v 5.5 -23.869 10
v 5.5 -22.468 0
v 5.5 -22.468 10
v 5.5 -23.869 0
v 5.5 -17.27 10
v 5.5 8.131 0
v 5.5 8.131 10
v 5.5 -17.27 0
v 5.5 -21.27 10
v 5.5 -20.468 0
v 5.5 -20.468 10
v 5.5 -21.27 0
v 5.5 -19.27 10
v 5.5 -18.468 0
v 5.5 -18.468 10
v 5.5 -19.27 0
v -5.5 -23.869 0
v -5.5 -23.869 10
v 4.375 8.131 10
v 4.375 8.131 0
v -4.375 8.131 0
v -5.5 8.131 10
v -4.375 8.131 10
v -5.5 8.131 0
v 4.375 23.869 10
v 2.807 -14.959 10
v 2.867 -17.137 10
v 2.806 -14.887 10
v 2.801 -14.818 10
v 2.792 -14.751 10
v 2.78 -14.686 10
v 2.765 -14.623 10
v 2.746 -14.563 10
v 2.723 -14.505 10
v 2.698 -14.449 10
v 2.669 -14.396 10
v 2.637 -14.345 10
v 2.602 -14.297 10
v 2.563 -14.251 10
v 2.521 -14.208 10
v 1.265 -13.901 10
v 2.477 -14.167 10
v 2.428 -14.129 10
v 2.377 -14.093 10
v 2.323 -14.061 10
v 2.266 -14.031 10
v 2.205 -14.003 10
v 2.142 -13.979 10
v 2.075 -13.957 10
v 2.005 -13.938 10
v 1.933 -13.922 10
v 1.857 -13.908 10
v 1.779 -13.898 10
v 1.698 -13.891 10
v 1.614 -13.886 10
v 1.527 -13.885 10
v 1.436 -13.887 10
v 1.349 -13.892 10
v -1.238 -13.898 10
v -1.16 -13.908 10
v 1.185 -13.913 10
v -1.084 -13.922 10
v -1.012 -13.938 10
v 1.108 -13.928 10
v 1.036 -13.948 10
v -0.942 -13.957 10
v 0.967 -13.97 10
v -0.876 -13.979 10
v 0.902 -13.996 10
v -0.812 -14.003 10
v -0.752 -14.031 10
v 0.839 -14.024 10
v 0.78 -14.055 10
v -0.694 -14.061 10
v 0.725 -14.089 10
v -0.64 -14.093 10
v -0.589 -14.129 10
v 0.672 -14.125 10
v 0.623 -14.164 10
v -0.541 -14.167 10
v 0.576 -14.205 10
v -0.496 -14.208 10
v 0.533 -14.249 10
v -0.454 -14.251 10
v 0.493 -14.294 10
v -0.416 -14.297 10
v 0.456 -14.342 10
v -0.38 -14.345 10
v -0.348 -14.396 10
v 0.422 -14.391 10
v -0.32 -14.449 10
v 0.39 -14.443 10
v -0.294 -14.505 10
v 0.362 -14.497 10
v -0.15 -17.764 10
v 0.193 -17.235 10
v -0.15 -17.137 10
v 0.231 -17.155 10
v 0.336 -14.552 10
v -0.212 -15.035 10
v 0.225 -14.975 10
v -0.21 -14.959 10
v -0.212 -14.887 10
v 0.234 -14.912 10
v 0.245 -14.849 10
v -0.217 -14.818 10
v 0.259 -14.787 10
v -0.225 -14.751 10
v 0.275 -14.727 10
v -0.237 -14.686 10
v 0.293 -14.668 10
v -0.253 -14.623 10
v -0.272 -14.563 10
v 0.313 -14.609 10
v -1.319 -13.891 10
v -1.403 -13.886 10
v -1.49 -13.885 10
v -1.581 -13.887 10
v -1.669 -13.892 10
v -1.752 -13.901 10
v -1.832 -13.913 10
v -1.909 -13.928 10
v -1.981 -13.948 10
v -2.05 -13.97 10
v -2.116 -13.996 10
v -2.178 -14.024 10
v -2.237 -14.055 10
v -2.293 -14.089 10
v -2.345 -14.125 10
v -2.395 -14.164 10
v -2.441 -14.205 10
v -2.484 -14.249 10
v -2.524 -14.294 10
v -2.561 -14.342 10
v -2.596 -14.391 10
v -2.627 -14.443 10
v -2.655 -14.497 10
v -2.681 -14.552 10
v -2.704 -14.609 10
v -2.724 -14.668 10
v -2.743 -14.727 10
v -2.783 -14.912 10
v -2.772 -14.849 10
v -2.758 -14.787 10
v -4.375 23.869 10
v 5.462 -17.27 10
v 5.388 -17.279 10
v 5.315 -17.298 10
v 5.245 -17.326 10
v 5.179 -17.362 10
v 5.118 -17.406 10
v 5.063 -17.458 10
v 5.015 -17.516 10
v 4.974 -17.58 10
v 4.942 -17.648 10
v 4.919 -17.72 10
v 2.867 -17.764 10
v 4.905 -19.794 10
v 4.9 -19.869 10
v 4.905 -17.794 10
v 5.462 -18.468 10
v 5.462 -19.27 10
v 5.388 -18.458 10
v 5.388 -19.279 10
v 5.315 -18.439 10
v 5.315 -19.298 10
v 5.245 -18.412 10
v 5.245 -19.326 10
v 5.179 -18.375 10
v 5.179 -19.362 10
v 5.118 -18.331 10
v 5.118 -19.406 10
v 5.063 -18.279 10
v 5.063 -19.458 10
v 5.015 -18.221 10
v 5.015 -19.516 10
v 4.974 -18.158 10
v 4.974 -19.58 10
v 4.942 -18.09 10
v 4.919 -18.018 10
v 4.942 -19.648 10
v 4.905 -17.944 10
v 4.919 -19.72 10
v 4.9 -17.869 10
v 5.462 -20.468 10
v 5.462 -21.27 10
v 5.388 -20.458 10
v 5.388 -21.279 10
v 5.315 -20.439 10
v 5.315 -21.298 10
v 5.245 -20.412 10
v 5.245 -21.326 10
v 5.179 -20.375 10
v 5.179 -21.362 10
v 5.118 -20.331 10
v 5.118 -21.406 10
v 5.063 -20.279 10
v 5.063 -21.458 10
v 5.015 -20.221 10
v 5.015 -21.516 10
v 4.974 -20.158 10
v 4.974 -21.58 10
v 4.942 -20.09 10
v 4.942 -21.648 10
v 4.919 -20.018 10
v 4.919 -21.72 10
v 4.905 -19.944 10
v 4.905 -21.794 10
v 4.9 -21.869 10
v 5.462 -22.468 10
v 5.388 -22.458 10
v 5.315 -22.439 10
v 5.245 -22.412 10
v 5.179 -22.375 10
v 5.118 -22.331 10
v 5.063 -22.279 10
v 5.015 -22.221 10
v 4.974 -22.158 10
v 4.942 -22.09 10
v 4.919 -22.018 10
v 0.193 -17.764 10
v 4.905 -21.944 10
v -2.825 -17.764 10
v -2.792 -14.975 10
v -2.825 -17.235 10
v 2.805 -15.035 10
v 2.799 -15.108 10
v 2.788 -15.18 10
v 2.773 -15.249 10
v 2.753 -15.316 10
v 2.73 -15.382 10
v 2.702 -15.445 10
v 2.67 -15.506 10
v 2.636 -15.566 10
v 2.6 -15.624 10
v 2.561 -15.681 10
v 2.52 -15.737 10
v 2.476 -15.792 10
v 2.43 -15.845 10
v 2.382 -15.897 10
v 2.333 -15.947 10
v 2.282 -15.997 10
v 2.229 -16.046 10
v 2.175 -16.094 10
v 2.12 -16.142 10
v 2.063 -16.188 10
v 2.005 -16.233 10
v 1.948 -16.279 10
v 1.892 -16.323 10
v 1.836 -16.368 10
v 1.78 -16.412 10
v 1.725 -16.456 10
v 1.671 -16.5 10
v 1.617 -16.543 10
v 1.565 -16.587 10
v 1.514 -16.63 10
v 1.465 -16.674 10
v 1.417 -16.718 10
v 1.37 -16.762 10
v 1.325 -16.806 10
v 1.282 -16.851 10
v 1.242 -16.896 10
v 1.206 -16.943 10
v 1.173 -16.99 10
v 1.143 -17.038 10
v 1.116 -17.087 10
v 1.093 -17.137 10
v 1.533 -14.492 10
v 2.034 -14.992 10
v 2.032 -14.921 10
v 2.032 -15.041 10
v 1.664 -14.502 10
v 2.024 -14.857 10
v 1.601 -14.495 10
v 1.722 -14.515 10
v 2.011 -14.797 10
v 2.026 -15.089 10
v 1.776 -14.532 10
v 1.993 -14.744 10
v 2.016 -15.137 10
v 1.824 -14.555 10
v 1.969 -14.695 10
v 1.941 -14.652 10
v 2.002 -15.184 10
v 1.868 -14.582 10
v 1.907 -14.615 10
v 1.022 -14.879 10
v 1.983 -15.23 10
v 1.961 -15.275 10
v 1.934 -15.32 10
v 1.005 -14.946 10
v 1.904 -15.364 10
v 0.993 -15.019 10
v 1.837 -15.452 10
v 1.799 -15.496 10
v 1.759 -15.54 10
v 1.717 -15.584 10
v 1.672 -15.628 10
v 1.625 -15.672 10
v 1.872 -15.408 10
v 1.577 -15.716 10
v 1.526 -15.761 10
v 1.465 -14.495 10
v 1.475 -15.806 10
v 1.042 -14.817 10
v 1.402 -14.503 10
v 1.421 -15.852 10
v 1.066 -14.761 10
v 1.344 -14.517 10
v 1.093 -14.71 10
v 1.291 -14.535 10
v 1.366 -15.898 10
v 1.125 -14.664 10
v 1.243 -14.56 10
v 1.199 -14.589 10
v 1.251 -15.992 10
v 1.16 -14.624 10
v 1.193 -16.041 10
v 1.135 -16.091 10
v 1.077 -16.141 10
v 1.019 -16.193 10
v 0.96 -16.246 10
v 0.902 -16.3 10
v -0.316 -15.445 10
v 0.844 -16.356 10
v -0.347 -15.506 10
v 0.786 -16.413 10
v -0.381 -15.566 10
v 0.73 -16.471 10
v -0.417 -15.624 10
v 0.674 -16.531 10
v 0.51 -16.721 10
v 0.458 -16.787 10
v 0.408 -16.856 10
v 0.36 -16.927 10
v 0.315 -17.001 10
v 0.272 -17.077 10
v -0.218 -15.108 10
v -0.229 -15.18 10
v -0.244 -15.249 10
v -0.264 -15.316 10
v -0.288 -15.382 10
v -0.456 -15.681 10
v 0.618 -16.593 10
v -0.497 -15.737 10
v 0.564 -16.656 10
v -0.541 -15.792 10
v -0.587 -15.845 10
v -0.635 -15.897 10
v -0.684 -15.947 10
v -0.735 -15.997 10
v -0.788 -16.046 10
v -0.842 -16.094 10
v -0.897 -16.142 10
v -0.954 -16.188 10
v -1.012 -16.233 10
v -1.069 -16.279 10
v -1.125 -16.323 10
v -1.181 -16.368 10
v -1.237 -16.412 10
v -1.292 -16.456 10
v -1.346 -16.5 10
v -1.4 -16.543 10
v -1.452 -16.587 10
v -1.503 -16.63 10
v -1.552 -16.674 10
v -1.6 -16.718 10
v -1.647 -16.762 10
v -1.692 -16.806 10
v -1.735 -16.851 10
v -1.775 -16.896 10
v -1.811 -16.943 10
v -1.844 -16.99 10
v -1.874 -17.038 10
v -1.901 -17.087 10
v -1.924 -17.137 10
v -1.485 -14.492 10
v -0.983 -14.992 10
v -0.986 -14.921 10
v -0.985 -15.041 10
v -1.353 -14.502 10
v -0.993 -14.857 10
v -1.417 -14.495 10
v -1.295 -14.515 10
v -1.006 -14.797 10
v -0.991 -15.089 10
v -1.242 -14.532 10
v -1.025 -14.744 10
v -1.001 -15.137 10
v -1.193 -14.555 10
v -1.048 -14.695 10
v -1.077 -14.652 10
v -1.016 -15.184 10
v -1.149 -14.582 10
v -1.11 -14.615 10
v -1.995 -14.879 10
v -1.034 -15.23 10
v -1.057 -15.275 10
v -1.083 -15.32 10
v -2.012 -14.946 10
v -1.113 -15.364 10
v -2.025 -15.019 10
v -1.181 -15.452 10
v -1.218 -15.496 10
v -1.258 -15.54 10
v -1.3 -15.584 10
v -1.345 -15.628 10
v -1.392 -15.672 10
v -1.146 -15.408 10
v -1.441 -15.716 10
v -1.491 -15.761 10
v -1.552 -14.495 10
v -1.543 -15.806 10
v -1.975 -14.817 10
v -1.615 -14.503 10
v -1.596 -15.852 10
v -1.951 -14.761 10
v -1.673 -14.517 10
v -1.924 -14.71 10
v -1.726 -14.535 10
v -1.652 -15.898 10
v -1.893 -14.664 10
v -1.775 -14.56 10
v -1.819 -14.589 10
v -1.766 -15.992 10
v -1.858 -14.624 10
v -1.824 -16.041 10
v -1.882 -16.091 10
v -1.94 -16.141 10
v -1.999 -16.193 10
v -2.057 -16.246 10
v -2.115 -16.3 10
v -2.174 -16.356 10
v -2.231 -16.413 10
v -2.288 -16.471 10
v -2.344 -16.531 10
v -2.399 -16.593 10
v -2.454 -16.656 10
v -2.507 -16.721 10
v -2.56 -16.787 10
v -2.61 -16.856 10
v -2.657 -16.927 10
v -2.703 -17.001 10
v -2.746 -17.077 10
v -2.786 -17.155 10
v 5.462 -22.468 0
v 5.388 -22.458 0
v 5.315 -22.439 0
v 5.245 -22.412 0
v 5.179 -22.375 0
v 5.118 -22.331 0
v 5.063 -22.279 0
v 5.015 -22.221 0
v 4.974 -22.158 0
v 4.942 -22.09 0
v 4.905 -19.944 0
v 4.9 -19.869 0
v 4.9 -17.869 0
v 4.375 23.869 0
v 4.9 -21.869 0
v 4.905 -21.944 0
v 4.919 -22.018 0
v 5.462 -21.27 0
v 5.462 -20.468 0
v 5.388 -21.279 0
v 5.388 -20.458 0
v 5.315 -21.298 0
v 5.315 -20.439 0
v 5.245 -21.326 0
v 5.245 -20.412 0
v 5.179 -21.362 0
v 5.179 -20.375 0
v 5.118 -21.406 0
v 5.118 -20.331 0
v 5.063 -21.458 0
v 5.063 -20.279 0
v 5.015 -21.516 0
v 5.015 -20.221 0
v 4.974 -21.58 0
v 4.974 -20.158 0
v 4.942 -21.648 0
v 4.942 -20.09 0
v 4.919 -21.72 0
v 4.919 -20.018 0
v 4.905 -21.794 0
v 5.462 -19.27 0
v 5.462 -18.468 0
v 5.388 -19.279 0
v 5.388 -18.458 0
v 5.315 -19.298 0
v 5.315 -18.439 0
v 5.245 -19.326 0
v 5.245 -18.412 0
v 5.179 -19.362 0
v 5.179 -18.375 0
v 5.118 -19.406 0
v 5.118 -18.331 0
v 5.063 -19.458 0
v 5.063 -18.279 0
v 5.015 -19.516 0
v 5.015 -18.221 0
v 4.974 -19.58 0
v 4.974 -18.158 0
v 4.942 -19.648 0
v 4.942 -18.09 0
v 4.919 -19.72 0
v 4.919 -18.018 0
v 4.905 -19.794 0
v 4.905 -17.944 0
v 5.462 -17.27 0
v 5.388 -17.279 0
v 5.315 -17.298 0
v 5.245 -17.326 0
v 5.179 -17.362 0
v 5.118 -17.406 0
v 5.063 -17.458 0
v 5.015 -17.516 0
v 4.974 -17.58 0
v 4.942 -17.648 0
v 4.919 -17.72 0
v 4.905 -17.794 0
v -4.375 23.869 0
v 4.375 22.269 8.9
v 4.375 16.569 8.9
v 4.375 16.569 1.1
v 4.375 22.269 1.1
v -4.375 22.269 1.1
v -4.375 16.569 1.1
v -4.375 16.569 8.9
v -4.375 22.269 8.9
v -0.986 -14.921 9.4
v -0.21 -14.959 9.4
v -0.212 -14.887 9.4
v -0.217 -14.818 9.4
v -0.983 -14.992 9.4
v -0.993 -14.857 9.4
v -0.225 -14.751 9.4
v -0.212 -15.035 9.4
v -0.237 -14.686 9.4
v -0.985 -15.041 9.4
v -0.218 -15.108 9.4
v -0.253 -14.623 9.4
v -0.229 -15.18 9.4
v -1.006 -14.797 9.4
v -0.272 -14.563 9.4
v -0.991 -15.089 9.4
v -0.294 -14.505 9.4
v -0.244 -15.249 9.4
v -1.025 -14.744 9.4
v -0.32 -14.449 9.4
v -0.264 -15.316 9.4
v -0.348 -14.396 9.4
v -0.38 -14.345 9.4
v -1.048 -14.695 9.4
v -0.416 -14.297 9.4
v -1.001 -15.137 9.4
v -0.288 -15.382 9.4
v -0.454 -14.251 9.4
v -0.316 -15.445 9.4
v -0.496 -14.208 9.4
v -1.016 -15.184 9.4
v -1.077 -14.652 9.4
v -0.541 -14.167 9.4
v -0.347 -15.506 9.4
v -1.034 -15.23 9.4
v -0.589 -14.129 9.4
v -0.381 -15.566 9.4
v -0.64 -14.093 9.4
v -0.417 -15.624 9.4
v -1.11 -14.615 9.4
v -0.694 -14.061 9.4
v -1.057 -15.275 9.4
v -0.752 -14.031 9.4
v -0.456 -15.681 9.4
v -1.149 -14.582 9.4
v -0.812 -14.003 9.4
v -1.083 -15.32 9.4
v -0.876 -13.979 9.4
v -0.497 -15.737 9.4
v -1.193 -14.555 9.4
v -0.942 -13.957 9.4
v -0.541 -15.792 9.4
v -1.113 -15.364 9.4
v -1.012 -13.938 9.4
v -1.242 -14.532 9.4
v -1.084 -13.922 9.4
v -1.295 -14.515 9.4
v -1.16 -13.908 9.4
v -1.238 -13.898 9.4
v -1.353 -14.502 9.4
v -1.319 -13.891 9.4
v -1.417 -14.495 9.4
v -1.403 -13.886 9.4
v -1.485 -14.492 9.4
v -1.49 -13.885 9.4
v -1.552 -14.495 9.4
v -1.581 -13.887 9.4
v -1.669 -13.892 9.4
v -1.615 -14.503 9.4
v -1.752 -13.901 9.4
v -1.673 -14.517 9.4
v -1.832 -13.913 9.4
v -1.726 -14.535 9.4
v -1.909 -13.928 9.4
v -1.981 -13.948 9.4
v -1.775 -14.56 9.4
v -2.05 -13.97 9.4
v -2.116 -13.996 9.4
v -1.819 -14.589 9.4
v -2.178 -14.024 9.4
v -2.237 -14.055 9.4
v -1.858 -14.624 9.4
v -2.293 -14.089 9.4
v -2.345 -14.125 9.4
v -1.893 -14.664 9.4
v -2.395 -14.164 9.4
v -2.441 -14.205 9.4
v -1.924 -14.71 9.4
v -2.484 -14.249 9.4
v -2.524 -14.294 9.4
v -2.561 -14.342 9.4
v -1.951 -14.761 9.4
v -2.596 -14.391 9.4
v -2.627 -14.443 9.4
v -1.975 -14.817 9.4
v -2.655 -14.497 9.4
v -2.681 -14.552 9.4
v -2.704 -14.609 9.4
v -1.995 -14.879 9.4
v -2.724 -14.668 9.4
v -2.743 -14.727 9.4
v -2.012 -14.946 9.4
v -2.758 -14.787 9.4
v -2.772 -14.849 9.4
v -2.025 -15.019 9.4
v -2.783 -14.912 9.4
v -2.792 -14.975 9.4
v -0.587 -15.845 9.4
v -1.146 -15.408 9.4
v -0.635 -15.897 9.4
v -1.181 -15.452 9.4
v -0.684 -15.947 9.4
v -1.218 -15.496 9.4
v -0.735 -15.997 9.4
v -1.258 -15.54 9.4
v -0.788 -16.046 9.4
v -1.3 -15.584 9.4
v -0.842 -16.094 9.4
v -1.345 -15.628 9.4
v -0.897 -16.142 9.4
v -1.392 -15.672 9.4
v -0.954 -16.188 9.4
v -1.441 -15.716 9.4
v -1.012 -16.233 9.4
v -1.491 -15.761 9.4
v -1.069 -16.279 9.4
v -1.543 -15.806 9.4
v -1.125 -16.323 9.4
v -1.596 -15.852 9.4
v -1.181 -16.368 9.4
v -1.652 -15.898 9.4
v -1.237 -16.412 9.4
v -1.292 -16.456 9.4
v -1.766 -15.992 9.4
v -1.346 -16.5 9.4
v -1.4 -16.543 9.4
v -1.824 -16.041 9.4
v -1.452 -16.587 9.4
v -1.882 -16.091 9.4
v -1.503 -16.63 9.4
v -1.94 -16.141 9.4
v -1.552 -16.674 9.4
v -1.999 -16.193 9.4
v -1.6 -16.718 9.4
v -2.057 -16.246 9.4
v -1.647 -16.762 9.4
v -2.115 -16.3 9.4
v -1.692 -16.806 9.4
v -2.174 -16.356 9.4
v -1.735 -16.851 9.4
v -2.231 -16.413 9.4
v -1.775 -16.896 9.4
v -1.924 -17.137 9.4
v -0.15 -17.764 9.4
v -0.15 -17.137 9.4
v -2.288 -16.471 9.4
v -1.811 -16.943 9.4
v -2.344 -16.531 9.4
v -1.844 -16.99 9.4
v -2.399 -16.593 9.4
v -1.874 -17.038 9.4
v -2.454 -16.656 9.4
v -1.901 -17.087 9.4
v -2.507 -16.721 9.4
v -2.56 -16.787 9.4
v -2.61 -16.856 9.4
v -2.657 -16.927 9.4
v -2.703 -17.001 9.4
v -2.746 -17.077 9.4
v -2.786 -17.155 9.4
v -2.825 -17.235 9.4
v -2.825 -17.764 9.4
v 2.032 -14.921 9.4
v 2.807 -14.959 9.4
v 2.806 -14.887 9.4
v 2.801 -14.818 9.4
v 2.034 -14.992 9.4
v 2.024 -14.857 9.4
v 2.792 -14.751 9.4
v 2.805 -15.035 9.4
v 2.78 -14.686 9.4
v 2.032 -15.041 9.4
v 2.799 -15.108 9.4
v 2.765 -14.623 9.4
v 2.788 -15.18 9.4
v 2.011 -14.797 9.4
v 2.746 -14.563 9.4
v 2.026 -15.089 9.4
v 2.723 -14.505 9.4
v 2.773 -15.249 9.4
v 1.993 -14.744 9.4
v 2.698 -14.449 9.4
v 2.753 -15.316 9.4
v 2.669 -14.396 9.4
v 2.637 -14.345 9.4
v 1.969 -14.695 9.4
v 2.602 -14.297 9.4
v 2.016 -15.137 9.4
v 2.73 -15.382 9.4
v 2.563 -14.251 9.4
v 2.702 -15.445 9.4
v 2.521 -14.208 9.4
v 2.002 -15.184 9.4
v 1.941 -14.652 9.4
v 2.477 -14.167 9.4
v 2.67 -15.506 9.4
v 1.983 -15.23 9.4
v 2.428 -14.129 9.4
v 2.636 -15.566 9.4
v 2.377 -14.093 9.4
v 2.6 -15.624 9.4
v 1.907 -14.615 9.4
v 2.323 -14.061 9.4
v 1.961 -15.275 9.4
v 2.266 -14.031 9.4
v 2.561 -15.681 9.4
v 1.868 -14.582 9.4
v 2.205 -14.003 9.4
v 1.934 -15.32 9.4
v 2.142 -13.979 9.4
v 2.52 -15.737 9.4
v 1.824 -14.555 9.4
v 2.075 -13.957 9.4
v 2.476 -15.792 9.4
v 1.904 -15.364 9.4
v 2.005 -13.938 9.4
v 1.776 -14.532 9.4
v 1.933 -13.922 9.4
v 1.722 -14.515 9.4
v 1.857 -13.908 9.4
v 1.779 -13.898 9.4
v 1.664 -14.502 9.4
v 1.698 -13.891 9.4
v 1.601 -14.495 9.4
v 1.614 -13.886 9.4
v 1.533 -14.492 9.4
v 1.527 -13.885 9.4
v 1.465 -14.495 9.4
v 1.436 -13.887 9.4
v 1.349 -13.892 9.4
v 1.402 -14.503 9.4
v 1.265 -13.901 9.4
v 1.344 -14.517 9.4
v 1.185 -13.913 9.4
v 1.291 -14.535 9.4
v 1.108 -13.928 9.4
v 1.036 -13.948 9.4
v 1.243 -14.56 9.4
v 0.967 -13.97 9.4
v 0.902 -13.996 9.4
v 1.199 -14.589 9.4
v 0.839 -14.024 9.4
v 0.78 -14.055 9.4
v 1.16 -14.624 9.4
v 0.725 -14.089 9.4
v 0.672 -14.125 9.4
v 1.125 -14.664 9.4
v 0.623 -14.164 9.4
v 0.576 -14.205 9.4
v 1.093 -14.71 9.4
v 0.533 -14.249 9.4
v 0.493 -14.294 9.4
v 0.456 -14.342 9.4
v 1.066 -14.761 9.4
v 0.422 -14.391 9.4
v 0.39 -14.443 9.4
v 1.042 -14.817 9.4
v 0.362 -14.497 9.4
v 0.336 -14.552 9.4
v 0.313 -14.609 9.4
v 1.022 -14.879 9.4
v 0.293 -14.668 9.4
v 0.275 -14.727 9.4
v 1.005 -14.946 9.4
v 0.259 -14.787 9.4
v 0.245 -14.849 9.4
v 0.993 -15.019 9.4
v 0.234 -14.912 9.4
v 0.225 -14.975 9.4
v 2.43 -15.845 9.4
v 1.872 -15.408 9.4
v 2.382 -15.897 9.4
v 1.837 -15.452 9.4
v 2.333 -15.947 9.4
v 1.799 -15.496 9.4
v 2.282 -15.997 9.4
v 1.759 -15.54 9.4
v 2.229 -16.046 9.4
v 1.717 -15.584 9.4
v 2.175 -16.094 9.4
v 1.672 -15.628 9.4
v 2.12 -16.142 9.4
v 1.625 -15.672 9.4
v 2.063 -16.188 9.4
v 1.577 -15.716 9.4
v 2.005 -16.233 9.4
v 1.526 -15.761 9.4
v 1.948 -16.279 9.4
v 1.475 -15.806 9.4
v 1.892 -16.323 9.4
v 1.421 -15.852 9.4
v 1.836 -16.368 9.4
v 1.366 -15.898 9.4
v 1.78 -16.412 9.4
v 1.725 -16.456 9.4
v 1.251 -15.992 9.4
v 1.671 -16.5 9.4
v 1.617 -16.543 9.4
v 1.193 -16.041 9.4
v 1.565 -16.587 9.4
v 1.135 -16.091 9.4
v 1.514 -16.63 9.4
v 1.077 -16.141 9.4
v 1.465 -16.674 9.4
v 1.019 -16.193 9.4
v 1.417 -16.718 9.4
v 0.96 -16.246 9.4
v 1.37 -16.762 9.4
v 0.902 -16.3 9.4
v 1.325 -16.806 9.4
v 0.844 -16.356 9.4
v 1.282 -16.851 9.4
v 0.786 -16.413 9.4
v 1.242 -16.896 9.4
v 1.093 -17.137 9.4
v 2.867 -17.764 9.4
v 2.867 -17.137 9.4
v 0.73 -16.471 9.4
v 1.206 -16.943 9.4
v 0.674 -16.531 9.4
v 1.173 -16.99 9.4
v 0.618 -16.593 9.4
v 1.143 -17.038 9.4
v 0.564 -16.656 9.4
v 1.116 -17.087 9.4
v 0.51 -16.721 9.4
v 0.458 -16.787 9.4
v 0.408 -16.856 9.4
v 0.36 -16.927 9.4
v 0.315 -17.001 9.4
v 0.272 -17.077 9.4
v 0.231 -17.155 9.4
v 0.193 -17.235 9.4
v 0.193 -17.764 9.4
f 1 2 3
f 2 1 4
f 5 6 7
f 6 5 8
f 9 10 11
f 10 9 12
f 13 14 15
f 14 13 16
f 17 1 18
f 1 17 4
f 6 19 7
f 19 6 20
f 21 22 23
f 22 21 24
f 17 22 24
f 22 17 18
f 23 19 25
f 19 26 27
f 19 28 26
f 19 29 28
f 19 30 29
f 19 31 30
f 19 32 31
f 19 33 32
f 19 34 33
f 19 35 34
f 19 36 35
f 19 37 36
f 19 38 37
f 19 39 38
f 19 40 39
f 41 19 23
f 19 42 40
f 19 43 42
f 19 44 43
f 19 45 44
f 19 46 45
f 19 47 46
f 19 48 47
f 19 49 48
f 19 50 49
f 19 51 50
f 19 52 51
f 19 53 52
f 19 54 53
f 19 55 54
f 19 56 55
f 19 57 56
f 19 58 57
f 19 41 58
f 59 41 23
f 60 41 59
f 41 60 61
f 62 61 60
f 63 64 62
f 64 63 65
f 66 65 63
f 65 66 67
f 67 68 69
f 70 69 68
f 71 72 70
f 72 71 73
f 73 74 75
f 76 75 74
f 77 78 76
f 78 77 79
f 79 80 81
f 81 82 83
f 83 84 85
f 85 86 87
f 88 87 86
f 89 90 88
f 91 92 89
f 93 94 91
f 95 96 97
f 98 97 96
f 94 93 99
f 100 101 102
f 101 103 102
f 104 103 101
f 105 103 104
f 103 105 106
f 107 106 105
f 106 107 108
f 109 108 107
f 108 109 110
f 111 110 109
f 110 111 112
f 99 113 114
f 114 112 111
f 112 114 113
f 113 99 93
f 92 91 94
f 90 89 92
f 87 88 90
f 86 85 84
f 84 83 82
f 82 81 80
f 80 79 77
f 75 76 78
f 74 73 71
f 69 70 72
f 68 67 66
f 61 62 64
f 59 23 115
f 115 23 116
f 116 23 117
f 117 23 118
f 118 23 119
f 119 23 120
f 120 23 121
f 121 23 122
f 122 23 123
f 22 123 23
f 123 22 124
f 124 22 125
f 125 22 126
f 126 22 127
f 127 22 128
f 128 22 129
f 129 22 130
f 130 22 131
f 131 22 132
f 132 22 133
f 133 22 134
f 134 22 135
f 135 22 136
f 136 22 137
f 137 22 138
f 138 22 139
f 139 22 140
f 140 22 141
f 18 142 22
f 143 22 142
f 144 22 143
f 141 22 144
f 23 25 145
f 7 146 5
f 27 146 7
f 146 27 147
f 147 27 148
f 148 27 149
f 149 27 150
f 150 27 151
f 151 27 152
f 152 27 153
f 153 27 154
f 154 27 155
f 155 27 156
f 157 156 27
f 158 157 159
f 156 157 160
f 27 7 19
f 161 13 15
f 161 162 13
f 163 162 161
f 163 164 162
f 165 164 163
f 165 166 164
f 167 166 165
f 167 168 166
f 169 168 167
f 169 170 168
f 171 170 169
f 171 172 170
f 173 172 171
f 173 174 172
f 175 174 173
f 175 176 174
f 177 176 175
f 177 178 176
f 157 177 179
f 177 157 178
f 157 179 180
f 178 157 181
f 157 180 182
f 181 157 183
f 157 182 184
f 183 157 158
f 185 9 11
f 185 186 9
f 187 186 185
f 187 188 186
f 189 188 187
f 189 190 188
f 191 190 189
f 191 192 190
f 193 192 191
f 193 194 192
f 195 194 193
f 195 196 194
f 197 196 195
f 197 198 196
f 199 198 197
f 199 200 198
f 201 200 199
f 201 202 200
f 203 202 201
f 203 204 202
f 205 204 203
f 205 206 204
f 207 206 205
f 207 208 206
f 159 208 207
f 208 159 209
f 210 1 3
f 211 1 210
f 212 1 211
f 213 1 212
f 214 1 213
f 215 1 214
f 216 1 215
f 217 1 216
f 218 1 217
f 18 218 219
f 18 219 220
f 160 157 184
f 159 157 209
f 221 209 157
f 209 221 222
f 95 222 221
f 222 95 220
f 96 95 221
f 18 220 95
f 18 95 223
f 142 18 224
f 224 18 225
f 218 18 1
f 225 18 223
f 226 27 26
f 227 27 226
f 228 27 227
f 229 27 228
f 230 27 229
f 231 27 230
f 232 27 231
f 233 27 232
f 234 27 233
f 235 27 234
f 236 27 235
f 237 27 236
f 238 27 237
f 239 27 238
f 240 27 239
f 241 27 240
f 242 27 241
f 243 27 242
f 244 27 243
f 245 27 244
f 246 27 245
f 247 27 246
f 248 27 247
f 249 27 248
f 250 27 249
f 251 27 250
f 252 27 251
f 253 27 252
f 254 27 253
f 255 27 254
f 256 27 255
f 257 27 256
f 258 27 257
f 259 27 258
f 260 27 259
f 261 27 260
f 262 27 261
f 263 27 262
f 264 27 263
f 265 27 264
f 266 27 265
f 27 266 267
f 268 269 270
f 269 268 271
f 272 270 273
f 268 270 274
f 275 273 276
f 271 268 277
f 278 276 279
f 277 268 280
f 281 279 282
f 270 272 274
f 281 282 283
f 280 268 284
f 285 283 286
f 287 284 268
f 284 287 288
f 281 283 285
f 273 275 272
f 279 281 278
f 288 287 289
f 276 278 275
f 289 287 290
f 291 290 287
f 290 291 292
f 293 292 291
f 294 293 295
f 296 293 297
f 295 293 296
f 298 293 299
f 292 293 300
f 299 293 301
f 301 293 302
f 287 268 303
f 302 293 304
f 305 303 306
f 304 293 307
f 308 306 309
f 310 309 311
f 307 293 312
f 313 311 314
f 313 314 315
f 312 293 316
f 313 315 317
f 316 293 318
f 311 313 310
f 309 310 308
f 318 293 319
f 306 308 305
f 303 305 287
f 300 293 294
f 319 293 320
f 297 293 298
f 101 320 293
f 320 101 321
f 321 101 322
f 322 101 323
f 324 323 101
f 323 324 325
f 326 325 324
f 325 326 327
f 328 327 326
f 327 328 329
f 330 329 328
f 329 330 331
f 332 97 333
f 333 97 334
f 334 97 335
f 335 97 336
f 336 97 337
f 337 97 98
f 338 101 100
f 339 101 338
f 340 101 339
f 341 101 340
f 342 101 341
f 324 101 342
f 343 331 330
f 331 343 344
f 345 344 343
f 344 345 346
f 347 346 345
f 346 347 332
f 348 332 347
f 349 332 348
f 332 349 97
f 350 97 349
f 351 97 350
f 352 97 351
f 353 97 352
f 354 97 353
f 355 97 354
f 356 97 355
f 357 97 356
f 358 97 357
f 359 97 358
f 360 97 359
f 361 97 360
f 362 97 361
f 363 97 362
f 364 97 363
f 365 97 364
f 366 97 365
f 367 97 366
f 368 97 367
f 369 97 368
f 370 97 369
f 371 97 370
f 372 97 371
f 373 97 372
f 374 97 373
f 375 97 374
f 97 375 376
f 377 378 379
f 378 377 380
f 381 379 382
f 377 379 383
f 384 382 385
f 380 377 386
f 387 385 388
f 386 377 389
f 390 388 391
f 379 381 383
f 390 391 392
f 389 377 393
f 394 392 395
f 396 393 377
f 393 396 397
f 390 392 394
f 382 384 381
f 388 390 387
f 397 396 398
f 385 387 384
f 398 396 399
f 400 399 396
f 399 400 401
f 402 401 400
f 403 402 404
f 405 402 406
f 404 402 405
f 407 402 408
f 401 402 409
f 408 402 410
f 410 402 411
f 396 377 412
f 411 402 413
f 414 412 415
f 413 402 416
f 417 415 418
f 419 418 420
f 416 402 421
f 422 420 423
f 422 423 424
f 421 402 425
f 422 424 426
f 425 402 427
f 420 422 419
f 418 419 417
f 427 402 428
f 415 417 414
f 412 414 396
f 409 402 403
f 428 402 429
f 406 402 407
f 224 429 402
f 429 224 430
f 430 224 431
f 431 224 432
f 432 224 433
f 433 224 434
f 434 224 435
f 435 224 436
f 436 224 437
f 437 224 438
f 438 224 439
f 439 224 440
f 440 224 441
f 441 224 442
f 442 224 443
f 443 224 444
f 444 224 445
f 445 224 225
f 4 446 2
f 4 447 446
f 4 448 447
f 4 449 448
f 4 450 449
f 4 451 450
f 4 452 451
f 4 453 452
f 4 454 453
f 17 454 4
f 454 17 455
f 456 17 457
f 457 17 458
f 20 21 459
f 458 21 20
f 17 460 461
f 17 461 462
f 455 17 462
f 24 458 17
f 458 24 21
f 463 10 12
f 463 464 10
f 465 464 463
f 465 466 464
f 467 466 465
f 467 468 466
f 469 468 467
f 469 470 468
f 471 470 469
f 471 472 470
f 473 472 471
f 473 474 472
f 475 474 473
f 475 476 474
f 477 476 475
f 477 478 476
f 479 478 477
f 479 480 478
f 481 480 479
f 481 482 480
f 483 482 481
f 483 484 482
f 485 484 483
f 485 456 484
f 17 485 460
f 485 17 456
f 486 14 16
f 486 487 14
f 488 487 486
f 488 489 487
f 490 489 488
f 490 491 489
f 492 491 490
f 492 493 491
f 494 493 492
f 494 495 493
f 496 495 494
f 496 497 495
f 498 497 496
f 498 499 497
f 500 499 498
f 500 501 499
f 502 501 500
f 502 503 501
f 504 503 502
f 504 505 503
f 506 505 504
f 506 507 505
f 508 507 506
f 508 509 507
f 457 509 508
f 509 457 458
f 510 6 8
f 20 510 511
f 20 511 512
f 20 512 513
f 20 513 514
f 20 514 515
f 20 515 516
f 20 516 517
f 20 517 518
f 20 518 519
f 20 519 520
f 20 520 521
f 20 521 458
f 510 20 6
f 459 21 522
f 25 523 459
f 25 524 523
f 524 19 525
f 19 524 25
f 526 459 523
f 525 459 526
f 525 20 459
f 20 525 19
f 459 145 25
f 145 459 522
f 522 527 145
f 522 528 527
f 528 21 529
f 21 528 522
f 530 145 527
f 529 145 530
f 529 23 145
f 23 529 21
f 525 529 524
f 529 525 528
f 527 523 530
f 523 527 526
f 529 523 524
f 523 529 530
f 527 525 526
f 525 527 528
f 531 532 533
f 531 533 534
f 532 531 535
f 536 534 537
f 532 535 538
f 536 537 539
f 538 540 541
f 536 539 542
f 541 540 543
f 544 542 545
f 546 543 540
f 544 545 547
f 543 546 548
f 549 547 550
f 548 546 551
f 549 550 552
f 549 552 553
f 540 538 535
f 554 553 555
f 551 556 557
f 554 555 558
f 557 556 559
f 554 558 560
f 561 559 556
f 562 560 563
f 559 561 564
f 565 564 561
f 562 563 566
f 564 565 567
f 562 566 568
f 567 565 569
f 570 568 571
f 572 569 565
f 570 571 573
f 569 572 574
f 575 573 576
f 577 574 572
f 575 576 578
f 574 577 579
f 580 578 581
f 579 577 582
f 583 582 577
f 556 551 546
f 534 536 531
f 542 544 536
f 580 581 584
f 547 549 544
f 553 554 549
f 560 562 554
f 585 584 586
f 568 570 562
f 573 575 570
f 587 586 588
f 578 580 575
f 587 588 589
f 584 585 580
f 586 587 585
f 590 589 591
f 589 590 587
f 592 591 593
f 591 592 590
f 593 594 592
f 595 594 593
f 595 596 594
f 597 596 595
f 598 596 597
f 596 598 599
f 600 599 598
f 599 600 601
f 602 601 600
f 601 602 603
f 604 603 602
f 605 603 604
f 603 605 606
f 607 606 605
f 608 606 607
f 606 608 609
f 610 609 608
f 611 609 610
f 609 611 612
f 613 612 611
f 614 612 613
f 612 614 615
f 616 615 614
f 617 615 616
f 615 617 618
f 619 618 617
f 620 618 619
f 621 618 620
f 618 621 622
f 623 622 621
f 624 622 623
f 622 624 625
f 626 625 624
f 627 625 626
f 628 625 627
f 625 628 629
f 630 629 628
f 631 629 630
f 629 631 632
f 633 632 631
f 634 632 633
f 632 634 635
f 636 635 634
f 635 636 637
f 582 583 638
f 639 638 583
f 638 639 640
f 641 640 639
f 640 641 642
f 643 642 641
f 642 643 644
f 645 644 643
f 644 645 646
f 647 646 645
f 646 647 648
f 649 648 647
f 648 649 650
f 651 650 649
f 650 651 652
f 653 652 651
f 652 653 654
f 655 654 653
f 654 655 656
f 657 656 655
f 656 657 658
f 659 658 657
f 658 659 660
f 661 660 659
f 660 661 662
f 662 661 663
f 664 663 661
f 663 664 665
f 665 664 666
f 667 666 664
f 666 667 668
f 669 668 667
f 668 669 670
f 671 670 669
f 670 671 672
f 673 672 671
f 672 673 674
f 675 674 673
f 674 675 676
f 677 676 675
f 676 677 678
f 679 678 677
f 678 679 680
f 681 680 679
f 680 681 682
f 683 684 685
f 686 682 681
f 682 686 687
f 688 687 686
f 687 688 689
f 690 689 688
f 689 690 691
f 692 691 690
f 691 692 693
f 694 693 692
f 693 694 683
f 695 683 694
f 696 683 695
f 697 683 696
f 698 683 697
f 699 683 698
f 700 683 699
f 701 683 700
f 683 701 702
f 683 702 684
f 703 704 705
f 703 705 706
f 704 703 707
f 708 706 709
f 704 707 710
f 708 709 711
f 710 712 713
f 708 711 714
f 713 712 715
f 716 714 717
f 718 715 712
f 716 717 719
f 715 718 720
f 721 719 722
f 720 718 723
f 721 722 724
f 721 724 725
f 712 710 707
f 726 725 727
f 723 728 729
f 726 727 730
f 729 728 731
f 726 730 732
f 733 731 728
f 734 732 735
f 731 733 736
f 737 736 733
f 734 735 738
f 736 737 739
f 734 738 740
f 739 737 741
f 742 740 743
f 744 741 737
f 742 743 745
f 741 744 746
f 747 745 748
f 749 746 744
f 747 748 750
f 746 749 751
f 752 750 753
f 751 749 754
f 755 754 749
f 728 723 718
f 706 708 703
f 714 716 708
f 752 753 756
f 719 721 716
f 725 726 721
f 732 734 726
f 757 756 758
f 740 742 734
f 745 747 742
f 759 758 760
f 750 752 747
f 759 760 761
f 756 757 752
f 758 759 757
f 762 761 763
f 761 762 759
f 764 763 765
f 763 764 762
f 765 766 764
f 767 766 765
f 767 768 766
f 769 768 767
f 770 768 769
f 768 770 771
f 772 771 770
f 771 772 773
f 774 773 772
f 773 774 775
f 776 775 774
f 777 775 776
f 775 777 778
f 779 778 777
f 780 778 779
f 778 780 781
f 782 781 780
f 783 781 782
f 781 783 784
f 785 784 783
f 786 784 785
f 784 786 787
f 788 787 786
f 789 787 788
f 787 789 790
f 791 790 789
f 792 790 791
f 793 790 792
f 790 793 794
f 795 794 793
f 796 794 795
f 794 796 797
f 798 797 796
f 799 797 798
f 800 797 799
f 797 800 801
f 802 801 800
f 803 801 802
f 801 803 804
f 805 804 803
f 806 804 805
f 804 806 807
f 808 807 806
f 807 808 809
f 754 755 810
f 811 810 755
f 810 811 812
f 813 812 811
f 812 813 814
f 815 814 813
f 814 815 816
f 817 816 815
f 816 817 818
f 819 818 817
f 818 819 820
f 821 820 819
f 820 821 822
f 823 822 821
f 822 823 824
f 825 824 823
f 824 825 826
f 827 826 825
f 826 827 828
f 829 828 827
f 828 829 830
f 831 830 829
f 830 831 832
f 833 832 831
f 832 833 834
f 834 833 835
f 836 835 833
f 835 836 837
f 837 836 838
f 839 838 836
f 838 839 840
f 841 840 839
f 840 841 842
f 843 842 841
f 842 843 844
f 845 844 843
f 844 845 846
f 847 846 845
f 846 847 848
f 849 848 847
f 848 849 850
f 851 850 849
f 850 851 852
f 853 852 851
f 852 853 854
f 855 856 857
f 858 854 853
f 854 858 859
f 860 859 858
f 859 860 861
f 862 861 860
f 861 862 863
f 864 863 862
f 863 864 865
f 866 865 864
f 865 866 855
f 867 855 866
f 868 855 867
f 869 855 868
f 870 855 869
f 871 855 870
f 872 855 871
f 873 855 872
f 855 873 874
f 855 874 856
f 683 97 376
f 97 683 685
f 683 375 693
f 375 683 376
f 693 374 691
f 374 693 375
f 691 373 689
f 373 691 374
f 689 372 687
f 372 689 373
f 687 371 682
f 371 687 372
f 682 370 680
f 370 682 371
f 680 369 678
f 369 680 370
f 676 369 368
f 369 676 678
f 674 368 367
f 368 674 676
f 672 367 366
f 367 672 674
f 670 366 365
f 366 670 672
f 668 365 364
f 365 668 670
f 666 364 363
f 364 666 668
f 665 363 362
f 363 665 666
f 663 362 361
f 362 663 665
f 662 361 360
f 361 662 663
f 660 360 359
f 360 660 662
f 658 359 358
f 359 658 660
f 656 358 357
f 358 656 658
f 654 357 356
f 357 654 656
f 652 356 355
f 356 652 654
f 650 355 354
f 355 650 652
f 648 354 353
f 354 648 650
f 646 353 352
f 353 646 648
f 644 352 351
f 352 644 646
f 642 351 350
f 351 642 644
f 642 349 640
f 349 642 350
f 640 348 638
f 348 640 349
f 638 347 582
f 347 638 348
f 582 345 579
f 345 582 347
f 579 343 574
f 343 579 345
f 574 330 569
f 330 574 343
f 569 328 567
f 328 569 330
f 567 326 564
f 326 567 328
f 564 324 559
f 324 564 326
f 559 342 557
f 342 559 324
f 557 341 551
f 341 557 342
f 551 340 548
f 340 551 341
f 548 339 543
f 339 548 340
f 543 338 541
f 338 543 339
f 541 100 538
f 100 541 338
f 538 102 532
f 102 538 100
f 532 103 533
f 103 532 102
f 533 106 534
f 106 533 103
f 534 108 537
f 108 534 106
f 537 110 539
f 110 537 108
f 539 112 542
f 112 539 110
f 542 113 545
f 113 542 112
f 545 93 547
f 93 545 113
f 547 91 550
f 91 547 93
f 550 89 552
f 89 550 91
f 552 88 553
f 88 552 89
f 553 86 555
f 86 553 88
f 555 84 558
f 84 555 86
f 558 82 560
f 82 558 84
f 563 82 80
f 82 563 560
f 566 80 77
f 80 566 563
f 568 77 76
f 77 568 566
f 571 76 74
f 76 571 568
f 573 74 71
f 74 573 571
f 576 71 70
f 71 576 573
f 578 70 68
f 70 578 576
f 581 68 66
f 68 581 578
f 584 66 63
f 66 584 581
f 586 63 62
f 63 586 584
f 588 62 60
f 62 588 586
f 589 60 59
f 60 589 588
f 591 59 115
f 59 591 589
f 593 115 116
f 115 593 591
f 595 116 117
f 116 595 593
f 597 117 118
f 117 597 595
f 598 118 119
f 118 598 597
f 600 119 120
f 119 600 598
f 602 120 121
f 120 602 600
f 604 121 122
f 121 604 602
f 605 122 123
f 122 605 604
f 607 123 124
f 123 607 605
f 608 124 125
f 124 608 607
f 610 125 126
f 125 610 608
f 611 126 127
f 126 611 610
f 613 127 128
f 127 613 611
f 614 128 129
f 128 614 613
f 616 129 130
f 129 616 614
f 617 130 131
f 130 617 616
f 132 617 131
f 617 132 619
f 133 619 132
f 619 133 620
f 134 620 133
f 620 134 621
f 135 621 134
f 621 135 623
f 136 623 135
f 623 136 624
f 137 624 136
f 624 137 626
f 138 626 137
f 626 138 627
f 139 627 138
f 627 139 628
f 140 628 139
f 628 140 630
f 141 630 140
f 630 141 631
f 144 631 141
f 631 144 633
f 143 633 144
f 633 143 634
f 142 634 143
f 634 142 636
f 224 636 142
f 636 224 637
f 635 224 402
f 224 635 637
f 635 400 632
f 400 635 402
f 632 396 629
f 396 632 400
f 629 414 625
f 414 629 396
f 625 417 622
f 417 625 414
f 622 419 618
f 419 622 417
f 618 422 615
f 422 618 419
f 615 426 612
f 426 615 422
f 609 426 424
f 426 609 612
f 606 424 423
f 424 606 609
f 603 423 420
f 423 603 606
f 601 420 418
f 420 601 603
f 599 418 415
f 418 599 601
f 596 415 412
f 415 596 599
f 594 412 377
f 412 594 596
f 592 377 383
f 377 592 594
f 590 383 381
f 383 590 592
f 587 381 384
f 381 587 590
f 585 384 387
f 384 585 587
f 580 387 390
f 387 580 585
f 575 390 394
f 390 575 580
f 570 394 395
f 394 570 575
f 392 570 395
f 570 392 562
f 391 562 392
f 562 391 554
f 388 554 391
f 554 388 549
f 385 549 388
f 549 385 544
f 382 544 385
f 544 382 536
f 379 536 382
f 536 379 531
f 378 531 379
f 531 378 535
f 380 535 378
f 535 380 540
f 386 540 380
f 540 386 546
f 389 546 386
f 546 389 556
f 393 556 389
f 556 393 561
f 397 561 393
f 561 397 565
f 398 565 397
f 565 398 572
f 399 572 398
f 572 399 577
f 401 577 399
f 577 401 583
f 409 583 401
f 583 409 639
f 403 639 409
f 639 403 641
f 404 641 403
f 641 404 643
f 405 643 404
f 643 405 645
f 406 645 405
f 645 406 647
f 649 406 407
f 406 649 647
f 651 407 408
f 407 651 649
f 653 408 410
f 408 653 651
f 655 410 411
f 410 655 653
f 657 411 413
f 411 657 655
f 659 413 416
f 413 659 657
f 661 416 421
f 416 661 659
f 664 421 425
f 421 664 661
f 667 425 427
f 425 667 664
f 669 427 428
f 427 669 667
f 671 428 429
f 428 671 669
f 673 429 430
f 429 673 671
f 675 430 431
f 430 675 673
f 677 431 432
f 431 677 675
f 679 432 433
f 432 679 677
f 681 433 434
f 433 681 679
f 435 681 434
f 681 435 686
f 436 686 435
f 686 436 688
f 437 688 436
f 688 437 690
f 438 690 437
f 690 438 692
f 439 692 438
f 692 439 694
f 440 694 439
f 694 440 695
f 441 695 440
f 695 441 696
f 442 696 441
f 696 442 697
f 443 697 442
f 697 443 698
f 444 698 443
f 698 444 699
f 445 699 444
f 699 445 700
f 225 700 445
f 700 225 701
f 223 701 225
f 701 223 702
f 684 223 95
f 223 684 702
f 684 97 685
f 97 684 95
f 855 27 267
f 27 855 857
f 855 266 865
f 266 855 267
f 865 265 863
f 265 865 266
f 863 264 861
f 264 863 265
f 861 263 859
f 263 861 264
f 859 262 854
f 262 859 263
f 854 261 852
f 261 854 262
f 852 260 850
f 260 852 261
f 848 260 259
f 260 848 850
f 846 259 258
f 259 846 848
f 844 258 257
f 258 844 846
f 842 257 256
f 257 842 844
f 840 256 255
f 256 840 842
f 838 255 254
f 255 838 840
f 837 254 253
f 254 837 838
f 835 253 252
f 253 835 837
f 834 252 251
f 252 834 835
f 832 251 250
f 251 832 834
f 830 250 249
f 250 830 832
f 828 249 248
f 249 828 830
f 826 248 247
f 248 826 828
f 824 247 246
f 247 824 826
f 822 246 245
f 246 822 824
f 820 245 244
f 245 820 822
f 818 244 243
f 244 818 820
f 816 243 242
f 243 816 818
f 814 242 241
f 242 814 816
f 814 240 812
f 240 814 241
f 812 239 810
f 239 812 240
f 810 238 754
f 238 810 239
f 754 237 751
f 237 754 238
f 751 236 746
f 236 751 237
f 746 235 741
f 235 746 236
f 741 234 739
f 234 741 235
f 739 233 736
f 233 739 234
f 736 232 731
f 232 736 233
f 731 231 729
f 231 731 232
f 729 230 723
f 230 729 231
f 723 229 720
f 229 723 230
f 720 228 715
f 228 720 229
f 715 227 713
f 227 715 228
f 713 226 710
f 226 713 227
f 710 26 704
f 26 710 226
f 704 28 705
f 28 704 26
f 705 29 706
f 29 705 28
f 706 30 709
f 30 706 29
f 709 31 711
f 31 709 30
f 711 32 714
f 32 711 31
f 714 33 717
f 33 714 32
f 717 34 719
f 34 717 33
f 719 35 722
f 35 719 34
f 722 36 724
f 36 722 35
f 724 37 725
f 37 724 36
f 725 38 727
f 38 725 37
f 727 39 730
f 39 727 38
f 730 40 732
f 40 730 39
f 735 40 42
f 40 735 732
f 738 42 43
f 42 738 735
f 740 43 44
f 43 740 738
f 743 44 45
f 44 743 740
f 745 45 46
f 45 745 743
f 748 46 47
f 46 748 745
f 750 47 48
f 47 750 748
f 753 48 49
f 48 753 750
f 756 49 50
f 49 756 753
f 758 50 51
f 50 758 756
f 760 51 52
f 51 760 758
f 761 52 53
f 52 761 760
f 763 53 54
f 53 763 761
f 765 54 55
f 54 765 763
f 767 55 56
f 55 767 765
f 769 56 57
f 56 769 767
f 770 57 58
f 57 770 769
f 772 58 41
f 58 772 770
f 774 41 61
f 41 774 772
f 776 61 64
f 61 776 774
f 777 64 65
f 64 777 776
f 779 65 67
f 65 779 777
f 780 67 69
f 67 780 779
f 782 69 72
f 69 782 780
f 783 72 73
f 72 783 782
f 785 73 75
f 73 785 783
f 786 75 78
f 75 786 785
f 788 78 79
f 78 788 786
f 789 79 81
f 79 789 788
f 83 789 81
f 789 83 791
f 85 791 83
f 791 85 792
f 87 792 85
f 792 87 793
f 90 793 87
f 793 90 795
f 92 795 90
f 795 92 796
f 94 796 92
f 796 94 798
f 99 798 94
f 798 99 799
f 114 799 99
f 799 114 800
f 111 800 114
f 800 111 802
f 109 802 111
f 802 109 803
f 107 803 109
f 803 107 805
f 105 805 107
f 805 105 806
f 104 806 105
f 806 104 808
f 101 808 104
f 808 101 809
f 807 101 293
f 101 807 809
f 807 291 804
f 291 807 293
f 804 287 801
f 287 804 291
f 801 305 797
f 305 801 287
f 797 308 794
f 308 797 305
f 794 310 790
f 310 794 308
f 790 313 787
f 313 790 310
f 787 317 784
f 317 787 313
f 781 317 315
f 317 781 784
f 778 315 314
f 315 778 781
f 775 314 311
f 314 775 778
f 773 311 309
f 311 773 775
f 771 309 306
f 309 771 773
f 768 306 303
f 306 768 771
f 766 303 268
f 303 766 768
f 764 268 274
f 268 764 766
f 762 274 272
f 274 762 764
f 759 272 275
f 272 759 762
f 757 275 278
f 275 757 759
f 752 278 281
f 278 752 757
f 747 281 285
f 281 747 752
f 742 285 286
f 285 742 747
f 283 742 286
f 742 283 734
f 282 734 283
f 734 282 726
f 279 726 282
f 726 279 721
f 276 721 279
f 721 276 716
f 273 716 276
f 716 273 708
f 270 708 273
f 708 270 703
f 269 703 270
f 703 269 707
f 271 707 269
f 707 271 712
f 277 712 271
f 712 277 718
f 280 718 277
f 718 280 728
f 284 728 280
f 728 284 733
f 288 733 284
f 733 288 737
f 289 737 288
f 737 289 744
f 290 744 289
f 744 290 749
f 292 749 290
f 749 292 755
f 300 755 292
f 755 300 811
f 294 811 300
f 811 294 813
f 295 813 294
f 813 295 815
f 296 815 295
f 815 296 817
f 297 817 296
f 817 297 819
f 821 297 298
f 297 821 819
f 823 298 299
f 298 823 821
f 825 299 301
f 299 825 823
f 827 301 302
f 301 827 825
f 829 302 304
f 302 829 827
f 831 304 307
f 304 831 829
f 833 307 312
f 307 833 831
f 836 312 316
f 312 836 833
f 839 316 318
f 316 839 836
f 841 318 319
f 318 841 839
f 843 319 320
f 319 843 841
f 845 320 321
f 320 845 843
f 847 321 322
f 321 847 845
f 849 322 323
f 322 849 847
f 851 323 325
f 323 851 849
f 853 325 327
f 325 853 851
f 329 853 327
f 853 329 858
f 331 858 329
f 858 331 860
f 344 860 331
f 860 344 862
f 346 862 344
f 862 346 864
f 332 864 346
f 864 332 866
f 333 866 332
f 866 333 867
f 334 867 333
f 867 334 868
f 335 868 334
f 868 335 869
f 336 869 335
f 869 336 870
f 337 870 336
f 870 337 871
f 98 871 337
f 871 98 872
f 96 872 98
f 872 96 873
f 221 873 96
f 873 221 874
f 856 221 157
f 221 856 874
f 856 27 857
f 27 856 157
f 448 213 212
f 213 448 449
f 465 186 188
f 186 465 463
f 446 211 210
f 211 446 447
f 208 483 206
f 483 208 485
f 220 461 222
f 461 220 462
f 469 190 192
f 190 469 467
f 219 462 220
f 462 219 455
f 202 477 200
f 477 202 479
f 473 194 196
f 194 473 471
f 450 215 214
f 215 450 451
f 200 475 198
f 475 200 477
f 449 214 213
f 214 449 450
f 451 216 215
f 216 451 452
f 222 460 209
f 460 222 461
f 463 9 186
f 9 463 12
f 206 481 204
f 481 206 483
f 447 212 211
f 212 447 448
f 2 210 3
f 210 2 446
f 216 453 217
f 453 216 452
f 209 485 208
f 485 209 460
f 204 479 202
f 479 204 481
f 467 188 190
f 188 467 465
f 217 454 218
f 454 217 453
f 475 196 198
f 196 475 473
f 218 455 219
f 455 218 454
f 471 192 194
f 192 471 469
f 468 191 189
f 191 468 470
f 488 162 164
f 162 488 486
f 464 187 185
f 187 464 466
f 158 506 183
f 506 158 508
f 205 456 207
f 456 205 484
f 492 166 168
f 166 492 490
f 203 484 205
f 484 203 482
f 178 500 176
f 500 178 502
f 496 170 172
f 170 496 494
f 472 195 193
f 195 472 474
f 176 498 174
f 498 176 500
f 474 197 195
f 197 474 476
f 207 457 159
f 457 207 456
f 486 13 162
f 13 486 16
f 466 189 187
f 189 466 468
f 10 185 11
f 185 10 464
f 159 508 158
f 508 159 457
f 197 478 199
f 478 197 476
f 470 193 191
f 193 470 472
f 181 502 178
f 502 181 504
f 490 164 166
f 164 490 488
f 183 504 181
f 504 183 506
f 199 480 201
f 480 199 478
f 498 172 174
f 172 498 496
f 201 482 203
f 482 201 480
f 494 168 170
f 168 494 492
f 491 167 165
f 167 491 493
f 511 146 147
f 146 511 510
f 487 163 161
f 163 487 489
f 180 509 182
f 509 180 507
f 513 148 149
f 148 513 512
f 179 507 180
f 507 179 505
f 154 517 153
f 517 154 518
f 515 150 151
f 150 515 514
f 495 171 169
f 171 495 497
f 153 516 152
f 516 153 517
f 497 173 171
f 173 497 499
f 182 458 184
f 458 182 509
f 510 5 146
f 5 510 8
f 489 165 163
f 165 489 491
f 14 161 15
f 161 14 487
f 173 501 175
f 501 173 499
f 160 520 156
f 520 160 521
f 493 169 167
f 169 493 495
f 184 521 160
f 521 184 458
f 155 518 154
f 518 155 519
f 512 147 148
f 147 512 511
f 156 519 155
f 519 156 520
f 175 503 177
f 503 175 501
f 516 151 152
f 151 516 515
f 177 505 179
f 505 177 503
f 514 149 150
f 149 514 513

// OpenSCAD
$fn = 50;

difference() {
	union() {
		translate(v = [0, 8.131250000000001, 0]) {
			rotate(a = [90, 0, 0]) {
				difference() {
					union() {
						translate(v = [-5.5, 0, 0]) {
							cube(size = [11.0, 10.0, 32.0]);
						}
						translate(v = [-4.375, 0, -15.737499999999997]) {
							cube(size = [8.75, 10.0, 15.837499999999997]);
						}
					}
					union() {
						translate(v = [-4.475, 1.1, -14.137499999999998]) {
							cube(size = [8.95, 7.8, 5.7]);
						}
						translate(v = [0, 9.4, 24.0]) {
							rotate(a = [-90, 0, 0]) {
								linear_extrude(height = 0.7) {
									text(font = "Arial:style=Bold", halign = "center", size = 4.0, text = "22", valign = "center");
								}
							}
						}
						translate(v = [5.5, 10.1, 30.0]) {
							rotate(a = [90, 0, 0]) {
								cylinder(h = 10.2, r = 0.6);
							}
						}
						translate(v = [5.5, 10.1, 28.0]) {
							rotate(a = [90, 0, 0]) {
								cylinder(h = 10.2, r = 0.6);
							}
						}
						translate(v = [5.5, 10.1, 26.0]) {
							rotate(a = [90, 0, 0]) {
								cylinder(h = 10.2, r = 0.6);
							}
						}
					}
				}
			}
		}
	}
	union();
}
